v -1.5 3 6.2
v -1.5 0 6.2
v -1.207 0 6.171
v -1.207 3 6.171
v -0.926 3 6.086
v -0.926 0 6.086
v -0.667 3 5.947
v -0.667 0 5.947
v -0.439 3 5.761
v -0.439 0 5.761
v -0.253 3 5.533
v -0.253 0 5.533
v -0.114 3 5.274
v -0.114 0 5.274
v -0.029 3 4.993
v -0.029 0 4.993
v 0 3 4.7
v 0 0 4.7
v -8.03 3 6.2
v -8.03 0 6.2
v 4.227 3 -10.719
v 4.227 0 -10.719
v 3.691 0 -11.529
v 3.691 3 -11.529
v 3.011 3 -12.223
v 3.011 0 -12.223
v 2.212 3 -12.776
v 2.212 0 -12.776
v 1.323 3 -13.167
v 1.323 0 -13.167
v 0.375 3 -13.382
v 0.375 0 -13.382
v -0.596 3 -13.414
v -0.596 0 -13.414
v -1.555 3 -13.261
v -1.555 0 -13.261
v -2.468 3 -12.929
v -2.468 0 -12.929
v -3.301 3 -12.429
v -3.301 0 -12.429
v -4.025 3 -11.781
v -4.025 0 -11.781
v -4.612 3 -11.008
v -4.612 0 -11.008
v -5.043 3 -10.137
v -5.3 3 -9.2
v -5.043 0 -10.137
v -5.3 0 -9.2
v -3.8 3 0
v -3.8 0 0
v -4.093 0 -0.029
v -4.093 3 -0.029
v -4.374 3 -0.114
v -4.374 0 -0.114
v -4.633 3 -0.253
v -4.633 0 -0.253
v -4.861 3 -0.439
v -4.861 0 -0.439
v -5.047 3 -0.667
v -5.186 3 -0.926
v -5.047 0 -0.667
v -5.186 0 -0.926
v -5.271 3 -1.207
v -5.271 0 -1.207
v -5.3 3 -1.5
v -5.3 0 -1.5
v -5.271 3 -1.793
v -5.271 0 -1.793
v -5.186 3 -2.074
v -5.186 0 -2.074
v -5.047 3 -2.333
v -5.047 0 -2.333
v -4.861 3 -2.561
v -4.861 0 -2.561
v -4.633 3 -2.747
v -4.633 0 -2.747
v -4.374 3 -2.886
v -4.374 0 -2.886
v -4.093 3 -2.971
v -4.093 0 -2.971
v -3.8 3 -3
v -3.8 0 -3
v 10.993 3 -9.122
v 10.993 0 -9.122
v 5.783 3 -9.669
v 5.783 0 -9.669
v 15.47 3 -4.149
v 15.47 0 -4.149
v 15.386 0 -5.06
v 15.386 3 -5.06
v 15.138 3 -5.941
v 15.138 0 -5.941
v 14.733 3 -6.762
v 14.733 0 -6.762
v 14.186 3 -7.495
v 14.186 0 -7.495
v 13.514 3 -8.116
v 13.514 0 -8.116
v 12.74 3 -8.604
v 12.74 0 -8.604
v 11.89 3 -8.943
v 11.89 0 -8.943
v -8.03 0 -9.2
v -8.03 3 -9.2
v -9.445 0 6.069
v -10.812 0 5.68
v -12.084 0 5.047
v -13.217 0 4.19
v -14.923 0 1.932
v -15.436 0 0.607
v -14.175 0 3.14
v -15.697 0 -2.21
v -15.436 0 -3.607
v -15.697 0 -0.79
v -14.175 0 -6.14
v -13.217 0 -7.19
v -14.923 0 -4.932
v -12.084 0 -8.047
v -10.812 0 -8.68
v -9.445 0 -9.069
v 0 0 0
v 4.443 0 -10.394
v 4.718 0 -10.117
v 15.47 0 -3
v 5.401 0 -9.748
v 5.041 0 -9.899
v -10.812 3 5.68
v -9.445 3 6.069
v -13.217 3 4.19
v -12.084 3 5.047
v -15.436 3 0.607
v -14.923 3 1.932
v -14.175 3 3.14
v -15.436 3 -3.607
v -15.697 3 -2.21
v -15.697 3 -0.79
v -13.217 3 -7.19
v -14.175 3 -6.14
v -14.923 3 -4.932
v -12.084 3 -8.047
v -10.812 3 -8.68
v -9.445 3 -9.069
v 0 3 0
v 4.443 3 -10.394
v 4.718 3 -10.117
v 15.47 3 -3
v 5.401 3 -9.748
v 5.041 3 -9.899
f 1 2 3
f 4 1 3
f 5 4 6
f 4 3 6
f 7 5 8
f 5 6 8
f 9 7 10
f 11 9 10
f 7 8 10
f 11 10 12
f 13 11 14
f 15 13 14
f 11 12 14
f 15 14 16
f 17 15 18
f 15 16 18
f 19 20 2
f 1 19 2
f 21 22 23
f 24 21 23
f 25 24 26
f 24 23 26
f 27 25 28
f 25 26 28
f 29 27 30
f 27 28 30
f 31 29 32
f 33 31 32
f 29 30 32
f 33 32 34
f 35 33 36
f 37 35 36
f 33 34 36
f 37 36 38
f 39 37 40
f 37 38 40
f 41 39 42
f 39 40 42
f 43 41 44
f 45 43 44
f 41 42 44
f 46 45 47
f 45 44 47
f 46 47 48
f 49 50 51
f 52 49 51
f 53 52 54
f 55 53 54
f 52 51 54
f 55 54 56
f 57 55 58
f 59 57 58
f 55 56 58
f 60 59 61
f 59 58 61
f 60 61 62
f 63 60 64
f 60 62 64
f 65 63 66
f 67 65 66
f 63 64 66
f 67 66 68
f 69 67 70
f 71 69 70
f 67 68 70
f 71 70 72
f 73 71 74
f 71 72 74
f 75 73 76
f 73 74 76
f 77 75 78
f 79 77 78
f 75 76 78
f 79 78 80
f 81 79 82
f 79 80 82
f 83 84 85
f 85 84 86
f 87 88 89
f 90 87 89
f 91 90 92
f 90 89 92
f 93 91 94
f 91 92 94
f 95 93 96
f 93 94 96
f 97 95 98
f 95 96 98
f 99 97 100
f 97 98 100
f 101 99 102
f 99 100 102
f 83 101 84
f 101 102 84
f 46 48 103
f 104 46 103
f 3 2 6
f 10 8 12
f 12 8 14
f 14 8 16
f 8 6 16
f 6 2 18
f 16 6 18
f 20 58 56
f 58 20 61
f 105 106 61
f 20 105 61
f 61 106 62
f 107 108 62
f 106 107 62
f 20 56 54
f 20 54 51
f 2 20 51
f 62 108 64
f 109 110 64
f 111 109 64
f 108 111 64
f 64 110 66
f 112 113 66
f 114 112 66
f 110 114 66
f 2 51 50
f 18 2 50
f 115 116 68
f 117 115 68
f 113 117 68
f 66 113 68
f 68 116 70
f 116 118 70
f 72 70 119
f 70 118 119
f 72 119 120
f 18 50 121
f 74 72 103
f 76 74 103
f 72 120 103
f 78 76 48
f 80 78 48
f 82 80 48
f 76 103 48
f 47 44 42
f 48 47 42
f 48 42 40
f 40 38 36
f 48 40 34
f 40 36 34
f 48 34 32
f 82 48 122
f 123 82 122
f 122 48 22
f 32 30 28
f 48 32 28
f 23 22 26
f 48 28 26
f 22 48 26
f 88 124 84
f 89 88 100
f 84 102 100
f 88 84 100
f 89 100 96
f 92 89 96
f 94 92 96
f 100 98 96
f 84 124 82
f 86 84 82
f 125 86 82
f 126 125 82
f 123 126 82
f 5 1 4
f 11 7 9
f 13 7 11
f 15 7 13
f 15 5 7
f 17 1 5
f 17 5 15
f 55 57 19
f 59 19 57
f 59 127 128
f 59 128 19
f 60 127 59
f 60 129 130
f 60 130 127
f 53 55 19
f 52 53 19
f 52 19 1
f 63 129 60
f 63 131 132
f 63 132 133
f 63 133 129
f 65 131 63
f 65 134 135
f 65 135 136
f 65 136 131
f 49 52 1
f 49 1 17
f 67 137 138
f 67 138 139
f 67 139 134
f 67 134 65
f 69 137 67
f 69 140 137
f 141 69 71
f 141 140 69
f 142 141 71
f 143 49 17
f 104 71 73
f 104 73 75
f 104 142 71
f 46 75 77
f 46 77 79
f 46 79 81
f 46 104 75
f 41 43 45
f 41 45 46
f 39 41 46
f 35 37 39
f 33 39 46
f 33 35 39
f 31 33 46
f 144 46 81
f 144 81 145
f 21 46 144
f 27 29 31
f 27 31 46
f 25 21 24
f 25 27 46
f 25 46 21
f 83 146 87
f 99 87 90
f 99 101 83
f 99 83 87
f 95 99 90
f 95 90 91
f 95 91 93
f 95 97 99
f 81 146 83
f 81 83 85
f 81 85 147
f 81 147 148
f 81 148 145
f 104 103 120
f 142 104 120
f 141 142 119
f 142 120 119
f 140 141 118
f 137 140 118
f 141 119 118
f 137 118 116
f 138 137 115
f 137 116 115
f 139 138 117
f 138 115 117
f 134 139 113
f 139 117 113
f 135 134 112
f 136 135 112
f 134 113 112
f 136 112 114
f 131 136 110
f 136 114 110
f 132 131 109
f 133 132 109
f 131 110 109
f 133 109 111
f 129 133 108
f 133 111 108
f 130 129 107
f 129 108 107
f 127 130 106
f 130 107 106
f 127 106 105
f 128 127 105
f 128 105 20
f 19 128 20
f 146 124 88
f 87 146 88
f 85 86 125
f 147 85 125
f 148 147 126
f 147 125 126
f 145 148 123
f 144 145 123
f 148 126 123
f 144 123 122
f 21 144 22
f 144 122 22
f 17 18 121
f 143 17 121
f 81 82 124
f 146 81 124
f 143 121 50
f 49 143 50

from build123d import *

# Parameters (mm, degrees)
BOSS_EXTRUDE2_DEPTH = 3


with BuildPart() as part:
    # Sketch1 → Boss-Extrude2 (new body)
    with BuildSketch(Plane(origin=(0, 0, 0), x_dir=(1, 0, 0), z_dir=(0, 1, 0))):
        with BuildLine():
            Line((0, 0), (-3.8, 0))
            ThreePointArc((-3.8, 0), (-5.3, 1.5), (-3.8, 3))
            Line((-3.8, 3), (15.47, 3))
            Line((15.47, 3), (15.47, 4.149016738))
            ThreePointArc((15.47, 4.149016738), (14.185724127, 7.49466977), (10.992642316, 9.121626215))
            Line((10.992642316, 9.121626215), (5.783295319, 9.669150648))
            ThreePointArc((5.783295319, 9.669150648), (4.874143319, 10), (4.226657422, 10.718874584))
            ThreePointArc((4.226657422, 10.718874584), (-1.078837134, 13.36), (-5.3, 9.2))
            Line((-5.3, 9.2), (-8.03, 9.2))
            ThreePointArc((-8.03, 9.2), (-15.73, 1.5), (-8.03, -6.2))
            Line((-8.03, -6.2), (-1.5, -6.2))
            ThreePointArc((-1.5, -6.2), (-0.439339828, -5.760660172), (0, -4.7))
            Line((0, -4.7), (0, 0))
        make_face()
    extrude(amount=BOSS_EXTRUDE2_DEPTH)


solid = part.part
